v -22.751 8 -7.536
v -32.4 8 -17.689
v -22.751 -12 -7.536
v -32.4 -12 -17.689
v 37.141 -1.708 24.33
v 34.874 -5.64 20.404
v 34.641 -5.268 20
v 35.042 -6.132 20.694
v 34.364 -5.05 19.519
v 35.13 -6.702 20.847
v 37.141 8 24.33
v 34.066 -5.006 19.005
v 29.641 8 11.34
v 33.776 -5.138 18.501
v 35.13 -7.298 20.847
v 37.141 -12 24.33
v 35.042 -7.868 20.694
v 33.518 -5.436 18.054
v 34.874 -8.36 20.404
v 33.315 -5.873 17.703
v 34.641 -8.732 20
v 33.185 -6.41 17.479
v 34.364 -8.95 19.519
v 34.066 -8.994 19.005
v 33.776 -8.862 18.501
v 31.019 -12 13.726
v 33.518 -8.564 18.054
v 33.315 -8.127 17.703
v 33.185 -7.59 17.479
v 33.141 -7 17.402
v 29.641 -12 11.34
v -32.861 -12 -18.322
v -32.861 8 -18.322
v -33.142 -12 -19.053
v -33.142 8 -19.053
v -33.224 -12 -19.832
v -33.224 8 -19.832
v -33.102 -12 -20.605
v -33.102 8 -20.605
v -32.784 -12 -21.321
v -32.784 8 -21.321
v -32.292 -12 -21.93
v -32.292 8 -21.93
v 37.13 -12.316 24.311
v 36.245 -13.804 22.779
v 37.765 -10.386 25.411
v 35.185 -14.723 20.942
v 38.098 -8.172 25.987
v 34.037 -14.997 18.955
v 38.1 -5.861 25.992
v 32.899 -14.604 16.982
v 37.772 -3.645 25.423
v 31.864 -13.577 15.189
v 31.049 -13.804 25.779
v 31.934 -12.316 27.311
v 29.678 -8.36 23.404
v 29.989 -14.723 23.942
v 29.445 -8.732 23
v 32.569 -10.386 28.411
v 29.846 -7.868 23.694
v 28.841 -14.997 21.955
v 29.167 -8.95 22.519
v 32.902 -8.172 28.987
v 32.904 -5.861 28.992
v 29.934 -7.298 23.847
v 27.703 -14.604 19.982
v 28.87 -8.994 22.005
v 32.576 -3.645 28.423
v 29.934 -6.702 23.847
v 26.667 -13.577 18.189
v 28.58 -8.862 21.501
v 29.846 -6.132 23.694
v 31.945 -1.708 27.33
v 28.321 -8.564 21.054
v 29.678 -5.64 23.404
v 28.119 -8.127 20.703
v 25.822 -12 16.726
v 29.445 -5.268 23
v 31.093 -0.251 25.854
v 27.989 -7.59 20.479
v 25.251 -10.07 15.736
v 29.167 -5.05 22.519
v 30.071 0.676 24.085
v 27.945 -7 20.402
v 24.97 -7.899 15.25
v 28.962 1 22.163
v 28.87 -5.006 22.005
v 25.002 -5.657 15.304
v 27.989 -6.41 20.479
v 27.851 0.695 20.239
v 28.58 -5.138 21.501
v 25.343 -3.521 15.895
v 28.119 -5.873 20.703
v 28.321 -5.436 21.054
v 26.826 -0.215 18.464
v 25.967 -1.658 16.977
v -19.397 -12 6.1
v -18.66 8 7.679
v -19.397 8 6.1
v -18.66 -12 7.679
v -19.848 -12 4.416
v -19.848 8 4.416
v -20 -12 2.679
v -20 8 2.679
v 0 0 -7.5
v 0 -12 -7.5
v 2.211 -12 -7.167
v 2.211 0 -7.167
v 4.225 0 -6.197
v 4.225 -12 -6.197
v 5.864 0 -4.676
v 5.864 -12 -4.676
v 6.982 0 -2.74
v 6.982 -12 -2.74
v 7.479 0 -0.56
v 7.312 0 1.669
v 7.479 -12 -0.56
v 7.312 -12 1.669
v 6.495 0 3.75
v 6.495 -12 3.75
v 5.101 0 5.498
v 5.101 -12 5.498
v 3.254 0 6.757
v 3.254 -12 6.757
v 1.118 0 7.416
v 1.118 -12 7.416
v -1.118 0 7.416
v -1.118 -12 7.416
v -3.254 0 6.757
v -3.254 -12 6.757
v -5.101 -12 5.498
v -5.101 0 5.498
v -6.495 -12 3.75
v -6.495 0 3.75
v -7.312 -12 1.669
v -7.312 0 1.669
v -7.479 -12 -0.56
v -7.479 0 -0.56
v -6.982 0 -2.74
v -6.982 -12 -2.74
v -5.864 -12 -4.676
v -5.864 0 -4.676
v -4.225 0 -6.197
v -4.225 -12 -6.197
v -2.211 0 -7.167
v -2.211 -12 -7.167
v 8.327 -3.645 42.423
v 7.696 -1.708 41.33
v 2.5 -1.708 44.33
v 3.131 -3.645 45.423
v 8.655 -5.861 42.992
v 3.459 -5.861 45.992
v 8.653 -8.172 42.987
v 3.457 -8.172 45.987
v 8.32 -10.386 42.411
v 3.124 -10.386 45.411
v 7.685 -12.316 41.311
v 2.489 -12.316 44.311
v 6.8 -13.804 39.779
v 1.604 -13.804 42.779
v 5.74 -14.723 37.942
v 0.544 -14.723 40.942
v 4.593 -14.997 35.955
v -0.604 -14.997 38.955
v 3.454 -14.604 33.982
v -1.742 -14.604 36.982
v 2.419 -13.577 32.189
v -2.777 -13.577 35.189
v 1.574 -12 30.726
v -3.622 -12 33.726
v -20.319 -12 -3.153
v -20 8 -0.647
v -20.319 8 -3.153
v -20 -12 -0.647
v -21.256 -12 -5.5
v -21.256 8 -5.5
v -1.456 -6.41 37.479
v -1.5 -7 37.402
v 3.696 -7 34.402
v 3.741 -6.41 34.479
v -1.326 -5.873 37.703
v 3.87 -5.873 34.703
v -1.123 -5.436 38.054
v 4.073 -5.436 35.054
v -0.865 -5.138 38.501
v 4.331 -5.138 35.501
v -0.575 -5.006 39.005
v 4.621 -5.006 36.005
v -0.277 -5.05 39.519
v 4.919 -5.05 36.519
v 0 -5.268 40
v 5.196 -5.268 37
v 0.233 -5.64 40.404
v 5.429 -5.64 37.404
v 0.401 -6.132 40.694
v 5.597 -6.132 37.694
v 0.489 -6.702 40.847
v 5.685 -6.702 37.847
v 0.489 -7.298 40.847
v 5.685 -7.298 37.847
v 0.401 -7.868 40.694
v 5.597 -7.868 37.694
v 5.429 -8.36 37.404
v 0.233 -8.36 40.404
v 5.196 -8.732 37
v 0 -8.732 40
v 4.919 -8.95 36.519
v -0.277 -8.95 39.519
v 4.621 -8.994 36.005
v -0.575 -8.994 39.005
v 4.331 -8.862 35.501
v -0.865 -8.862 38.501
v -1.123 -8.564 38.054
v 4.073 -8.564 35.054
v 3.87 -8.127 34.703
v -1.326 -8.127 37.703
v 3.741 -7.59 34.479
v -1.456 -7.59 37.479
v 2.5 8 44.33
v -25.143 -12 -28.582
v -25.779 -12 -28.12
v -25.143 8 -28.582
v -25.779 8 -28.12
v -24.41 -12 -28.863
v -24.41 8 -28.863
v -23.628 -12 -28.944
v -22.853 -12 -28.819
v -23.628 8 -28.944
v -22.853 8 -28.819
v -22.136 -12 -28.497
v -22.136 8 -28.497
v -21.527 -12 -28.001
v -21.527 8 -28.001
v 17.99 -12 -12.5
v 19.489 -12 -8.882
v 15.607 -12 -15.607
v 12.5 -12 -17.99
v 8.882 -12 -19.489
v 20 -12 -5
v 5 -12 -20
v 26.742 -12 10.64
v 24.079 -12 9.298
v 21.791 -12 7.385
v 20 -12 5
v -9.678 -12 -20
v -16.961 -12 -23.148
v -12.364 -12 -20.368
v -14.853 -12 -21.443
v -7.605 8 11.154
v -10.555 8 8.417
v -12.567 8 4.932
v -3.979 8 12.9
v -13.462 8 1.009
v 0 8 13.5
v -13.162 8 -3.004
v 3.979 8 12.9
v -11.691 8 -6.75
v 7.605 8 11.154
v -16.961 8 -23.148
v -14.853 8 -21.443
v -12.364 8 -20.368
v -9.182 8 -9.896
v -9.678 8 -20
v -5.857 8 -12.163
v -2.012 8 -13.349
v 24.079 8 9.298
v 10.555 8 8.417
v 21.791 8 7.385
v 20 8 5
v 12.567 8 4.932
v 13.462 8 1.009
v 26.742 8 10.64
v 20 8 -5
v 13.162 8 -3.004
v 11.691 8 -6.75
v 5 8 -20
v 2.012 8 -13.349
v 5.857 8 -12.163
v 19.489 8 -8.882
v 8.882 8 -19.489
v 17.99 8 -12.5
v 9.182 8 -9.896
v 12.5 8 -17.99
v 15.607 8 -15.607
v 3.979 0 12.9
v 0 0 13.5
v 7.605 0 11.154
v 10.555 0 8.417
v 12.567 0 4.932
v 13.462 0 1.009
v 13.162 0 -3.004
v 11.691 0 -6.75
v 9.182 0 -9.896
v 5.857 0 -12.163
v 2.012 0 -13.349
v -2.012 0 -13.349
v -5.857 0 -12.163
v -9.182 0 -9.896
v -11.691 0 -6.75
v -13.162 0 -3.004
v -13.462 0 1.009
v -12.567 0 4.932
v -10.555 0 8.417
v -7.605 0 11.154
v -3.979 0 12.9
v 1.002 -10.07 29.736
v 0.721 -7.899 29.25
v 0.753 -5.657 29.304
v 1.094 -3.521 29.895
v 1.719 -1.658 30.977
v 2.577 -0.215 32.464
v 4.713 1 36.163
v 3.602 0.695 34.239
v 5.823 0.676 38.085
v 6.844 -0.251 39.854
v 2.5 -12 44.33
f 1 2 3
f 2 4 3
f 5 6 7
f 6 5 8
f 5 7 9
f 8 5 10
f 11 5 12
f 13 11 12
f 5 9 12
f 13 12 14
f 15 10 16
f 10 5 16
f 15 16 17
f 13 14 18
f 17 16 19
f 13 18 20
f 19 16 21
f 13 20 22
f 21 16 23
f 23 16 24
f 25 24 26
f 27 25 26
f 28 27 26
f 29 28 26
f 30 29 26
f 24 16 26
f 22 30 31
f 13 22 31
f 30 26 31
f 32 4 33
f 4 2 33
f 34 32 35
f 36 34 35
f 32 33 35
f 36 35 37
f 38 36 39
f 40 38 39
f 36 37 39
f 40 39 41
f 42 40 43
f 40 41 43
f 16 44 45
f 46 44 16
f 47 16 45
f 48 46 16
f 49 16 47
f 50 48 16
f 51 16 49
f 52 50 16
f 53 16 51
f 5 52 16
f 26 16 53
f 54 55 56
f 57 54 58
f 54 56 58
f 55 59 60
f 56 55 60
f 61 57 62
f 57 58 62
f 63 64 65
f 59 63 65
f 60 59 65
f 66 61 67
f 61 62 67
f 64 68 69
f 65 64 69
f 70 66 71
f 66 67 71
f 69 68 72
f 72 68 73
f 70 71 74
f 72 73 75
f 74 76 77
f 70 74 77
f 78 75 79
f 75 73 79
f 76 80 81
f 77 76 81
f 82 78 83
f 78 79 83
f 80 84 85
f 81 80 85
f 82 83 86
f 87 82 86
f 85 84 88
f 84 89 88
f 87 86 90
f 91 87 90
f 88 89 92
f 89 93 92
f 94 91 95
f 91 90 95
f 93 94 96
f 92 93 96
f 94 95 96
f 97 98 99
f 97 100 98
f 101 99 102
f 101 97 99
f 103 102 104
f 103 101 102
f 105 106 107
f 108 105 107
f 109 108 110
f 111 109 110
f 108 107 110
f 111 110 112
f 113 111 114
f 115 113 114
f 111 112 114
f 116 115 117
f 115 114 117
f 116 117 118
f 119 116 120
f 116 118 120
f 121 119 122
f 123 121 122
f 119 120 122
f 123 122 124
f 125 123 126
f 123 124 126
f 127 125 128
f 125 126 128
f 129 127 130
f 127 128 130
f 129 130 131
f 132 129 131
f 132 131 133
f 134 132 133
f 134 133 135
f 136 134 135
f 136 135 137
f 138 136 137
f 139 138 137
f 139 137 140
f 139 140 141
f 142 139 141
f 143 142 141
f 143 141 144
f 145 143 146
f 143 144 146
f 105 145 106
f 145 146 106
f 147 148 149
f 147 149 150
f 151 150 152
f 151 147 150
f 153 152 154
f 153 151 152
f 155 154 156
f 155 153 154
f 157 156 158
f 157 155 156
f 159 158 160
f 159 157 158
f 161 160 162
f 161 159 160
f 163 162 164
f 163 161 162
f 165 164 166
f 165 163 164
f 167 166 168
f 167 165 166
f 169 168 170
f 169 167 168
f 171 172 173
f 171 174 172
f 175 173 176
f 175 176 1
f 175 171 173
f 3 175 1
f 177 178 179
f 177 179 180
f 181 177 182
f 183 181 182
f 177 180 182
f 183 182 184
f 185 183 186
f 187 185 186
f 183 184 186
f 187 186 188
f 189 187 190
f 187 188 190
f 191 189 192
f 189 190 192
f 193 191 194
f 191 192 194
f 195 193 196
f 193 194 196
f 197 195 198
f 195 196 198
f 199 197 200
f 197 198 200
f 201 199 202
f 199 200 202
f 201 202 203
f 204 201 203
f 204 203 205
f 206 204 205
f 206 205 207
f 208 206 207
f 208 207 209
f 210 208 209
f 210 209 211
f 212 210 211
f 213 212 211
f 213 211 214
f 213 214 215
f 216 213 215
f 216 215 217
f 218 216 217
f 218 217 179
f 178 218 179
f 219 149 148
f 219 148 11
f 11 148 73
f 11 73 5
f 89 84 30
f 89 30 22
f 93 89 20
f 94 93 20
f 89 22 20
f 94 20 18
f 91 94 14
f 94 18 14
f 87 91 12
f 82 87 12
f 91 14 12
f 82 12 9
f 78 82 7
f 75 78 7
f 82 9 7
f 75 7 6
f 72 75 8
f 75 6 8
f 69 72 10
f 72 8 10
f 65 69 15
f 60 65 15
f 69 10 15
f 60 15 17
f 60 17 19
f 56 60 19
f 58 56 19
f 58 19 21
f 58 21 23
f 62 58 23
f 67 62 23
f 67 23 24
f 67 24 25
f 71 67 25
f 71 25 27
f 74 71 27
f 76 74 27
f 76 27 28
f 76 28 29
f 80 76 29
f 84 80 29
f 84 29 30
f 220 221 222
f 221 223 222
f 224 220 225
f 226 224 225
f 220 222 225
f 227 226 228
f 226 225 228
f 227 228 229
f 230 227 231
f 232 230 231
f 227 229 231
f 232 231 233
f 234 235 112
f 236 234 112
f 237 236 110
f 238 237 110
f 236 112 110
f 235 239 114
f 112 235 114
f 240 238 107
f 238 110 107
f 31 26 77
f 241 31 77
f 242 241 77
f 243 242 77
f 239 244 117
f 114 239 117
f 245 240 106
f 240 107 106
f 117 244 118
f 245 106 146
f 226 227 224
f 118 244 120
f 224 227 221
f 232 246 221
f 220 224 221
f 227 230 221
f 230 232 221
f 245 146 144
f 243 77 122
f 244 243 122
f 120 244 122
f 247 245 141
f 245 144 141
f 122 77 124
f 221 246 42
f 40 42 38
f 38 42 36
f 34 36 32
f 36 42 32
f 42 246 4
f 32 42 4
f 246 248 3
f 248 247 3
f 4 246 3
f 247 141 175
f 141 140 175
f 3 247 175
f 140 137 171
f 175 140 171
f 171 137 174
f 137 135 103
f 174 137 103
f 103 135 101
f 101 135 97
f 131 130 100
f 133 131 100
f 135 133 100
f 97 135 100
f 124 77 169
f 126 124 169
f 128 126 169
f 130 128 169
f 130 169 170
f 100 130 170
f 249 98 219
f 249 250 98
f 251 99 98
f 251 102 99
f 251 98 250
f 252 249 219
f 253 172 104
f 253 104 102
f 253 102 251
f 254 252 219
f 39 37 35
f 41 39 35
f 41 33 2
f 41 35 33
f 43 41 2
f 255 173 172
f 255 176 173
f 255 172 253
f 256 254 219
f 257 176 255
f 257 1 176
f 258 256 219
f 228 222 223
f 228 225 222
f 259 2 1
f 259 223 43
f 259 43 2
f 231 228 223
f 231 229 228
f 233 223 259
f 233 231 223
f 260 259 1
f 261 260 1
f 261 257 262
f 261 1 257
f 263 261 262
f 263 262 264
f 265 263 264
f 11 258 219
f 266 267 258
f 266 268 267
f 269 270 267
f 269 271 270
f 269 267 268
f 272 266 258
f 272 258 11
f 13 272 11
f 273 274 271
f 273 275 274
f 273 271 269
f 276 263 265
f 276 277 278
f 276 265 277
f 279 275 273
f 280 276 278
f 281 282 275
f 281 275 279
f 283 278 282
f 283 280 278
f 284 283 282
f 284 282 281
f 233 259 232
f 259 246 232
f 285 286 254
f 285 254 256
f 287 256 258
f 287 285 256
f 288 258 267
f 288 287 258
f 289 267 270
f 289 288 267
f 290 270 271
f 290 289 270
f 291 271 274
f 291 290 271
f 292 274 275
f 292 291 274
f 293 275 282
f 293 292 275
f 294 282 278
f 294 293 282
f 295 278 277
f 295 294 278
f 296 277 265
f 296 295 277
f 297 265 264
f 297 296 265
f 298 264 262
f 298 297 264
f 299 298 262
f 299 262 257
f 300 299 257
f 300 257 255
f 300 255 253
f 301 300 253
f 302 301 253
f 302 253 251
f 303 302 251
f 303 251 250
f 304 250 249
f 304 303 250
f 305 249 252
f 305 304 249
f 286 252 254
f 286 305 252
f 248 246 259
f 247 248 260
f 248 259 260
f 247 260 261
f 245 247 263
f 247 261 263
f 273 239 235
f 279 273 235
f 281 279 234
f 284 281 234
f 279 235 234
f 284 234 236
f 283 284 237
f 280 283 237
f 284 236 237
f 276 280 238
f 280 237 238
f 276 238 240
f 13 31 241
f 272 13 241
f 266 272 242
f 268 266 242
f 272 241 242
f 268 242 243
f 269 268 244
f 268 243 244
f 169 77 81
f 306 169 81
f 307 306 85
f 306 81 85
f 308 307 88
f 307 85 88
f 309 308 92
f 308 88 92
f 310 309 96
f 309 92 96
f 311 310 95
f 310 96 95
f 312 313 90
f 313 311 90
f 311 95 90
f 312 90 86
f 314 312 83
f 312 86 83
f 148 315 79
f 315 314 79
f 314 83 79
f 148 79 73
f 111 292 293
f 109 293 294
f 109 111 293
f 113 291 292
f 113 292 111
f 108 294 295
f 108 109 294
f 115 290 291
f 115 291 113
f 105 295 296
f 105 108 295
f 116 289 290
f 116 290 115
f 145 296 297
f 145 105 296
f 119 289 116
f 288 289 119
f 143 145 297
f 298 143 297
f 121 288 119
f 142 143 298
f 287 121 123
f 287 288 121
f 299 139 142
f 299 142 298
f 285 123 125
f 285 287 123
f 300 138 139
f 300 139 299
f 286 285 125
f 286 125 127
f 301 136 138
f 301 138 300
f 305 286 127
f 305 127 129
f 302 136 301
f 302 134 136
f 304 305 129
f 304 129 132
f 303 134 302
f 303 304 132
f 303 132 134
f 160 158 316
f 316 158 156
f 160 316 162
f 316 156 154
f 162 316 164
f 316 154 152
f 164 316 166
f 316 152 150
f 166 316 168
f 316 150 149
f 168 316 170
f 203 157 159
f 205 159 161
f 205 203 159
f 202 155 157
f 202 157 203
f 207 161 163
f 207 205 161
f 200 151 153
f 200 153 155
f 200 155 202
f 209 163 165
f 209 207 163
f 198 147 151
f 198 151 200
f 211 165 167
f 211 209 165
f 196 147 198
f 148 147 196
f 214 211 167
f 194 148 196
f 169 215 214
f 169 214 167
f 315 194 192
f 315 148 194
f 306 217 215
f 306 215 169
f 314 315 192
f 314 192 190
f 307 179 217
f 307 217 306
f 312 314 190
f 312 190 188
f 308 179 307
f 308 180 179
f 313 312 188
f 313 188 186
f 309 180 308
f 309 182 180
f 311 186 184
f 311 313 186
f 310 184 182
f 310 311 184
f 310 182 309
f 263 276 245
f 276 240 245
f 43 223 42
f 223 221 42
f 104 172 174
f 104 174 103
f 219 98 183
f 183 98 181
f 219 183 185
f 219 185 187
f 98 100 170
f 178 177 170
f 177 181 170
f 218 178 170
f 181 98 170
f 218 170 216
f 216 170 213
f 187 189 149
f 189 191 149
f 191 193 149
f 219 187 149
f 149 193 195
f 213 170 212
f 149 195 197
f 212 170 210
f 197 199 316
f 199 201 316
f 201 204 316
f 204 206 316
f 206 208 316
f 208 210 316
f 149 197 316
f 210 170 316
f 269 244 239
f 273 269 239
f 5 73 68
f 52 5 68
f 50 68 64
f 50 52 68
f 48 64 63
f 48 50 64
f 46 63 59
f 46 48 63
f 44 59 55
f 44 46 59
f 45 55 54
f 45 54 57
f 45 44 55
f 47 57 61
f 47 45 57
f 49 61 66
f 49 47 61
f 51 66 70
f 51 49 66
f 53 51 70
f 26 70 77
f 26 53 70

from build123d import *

# Parameters (mm, degrees)
SKETCH1_R           = 13.5
BOSS_EXTRUDE1_DEPTH = 8
BOSS_EXTRUDE3_START = 12
SKETCH7_R           = 7.5
BOSS_EXTRUDE3_DEPTH = 12
SKETCH4_W           = 28
SKETCH4_H           = 10
CUT_EXTRUDE2_DEPTH  = 12
SKETCH5_R           = 2
CUT_EXTRUDE3_DEPTH  = 100
SKETCH9_R           = 8
SKETCH9_R_2         = 2
BOSS_EXTRUDE4_DEPTH = 40
FILLET2_R           = 10
FILLET3_R           = 3
SKETCH11_R          = 8
CUT_EXTRUDE6_DEPTH  = 14


with BuildPart() as part:
    # Sketch1 → Boss-Extrude1 (new body)
    with BuildSketch(Plane(origin=(0, 0, 0), x_dir=(1, 0, 0), z_dir=(0, 1, 0))):
        with BuildLine():
            Line((2.5, -44.330127019), (37.141016151, -24.330127019))
            Line((37.141016151, -24.330127019), (29.641016151, -11.339745962))
            ThreePointArc((29.641016151, -11.339745962), (24.078586932, -9.298131712), (20, -5))
            Line((20, -5), (20, 5))
            ThreePointArc((20, 5), (15.606601718, 15.606601718), (5, 20))
            Line((5, 20), (-14, 20))
            Line((-14, 20), (-23.593165935, 30.196625292))
            Line((-23.593165935, 30.196625292), (-34.466370956, 19.863503181))
            Line((-34.466370956, 19.863503181), (-20, 4.641016151))
            Line((-20, 4.641016151), (-20, -5.358983849))
            Line((-20, -5.358983849), (2.5, -44.330127019))
        make_face()
        with Locations(Location((0, 0, 0), (0, 0, 270))):
            Circle(SKETCH1_R, mode=Mode.SUBTRACT)
    extrude(amount=BOSS_EXTRUDE1_DEPTH)

    # Sketch7 → Boss-Extrude3 (add)
    with BuildSketch(Plane.XZ.offset(BOSS_EXTRUDE3_START)):
        with BuildLine():
            Line((20, 5), (20, -5))
            ThreePointArc((20, -5), (15.606601718, -15.606601718), (5, -20))
            Line((5, -20), (-14, -20))
            Line((-14, -20), (-23.593165935, -30.196625292))
            Line((-23.593165935, -30.196625292), (-34.466370956, -19.863503181))
            Line((-34.466370956, -19.863503181), (-20, -4.641016151))
            Line((-20, -4.641016151), (-20, 5.358983849))
            Line((-20, 5.358983849), (2.5, 44.330127019))
            Line((2.5, 44.330127019), (37.141016151, 24.330127019))
            Line((37.141016151, 24.330127019), (29.641016151, 11.339745962))
            ThreePointArc((29.641016151, 11.339745962), (24.078586932, 9.298131712), (20, 5))
        make_face()
        with Locations(Location((0, 0, 0), (0, 0, 270))):
            Circle(SKETCH7_R, mode=Mode.SUBTRACT)
    extrude(amount=-BOSS_EXTRUDE3_DEPTH)

    # Sketch4 → Cut-Extrude2 (cut)
    with BuildSketch(Plane(origin=(19.820508076, 0, 34.330127019), x_dir=(0.8660254037844378, 0, -0.5000000000000016), z_dir=(0.5000000000000014, 0, 0.8660254037844377))):
        with Locations((0, -7)):
            Rectangle(SKETCH4_W, SKETCH4_H)
    extrude(amount=-CUT_EXTRUDE2_DEPTH, mode=Mode.SUBTRACT)

    # Sketch5 → Cut-Extrude3 (cut)
    with BuildSketch(Plane(origin=(17.320508076, 0, -10), x_dir=(-0.5000000000000026, 0, -0.8660254037844373), z_dir=(0.8660254037844373, 0, -0.5000000000000026))):
        with Locations((-33.641016151, -7)):
            Circle(SKETCH5_R)
    extrude(amount=-CUT_EXTRUDE3_DEPTH, mode=Mode.SUBTRACT)

    # Sketch9 → Boss-Extrude4 (add)
    with BuildSketch(Plane(origin=(17.320508076, 0, -10), x_dir=(-0.5000000000000017, 0, -0.8660254037844378), z_dir=(0.8660254037844377, 0, -0.5000000000000016))):
        with Locations((-33.641016151, -7)):
            Circle(SKETCH9_R)
        with Locations((-33.641016151, -7)):
            Circle(SKETCH9_R_2, mode=Mode.SUBTRACT)
    extrude(amount=-BOSS_EXTRUDE4_DEPTH)

    # Fillet2
    fillet2_edges = [part.edges().sort_by_distance(p)[0] for p in [
        (-20, -2, 5.358983849),
        (-20, -2, -4.641016151),
        (-14, -2, -20),
    ]]
    fillet(fillet2_edges, radius=FILLET2_R)

    # Fillet3
    fillet3_edges = [part.edges().sort_by_distance(p)[0] for p in [
        (-34.466370956, -2, -19.863503181),
        (-23.593165935, -2, -30.196625292),
    ]]
    fillet(fillet3_edges, radius=FILLET3_R)

    # Sketch11 → Cut-Extrude6 (cut, symmetric)
    with BuildSketch(Plane(origin=(0, 0, 0), x_dir=(-0.5000000000000017, 0, -0.8660254037844378), z_dir=(0.8660254037844377, 0, -0.5000000000000016))):
        with Locations((-33.641016151, -7)):
            Circle(SKETCH11_R)
    extrude(amount=CUT_EXTRUDE6_DEPTH, both=True, mode=Mode.SUBTRACT)


solid = part.part
